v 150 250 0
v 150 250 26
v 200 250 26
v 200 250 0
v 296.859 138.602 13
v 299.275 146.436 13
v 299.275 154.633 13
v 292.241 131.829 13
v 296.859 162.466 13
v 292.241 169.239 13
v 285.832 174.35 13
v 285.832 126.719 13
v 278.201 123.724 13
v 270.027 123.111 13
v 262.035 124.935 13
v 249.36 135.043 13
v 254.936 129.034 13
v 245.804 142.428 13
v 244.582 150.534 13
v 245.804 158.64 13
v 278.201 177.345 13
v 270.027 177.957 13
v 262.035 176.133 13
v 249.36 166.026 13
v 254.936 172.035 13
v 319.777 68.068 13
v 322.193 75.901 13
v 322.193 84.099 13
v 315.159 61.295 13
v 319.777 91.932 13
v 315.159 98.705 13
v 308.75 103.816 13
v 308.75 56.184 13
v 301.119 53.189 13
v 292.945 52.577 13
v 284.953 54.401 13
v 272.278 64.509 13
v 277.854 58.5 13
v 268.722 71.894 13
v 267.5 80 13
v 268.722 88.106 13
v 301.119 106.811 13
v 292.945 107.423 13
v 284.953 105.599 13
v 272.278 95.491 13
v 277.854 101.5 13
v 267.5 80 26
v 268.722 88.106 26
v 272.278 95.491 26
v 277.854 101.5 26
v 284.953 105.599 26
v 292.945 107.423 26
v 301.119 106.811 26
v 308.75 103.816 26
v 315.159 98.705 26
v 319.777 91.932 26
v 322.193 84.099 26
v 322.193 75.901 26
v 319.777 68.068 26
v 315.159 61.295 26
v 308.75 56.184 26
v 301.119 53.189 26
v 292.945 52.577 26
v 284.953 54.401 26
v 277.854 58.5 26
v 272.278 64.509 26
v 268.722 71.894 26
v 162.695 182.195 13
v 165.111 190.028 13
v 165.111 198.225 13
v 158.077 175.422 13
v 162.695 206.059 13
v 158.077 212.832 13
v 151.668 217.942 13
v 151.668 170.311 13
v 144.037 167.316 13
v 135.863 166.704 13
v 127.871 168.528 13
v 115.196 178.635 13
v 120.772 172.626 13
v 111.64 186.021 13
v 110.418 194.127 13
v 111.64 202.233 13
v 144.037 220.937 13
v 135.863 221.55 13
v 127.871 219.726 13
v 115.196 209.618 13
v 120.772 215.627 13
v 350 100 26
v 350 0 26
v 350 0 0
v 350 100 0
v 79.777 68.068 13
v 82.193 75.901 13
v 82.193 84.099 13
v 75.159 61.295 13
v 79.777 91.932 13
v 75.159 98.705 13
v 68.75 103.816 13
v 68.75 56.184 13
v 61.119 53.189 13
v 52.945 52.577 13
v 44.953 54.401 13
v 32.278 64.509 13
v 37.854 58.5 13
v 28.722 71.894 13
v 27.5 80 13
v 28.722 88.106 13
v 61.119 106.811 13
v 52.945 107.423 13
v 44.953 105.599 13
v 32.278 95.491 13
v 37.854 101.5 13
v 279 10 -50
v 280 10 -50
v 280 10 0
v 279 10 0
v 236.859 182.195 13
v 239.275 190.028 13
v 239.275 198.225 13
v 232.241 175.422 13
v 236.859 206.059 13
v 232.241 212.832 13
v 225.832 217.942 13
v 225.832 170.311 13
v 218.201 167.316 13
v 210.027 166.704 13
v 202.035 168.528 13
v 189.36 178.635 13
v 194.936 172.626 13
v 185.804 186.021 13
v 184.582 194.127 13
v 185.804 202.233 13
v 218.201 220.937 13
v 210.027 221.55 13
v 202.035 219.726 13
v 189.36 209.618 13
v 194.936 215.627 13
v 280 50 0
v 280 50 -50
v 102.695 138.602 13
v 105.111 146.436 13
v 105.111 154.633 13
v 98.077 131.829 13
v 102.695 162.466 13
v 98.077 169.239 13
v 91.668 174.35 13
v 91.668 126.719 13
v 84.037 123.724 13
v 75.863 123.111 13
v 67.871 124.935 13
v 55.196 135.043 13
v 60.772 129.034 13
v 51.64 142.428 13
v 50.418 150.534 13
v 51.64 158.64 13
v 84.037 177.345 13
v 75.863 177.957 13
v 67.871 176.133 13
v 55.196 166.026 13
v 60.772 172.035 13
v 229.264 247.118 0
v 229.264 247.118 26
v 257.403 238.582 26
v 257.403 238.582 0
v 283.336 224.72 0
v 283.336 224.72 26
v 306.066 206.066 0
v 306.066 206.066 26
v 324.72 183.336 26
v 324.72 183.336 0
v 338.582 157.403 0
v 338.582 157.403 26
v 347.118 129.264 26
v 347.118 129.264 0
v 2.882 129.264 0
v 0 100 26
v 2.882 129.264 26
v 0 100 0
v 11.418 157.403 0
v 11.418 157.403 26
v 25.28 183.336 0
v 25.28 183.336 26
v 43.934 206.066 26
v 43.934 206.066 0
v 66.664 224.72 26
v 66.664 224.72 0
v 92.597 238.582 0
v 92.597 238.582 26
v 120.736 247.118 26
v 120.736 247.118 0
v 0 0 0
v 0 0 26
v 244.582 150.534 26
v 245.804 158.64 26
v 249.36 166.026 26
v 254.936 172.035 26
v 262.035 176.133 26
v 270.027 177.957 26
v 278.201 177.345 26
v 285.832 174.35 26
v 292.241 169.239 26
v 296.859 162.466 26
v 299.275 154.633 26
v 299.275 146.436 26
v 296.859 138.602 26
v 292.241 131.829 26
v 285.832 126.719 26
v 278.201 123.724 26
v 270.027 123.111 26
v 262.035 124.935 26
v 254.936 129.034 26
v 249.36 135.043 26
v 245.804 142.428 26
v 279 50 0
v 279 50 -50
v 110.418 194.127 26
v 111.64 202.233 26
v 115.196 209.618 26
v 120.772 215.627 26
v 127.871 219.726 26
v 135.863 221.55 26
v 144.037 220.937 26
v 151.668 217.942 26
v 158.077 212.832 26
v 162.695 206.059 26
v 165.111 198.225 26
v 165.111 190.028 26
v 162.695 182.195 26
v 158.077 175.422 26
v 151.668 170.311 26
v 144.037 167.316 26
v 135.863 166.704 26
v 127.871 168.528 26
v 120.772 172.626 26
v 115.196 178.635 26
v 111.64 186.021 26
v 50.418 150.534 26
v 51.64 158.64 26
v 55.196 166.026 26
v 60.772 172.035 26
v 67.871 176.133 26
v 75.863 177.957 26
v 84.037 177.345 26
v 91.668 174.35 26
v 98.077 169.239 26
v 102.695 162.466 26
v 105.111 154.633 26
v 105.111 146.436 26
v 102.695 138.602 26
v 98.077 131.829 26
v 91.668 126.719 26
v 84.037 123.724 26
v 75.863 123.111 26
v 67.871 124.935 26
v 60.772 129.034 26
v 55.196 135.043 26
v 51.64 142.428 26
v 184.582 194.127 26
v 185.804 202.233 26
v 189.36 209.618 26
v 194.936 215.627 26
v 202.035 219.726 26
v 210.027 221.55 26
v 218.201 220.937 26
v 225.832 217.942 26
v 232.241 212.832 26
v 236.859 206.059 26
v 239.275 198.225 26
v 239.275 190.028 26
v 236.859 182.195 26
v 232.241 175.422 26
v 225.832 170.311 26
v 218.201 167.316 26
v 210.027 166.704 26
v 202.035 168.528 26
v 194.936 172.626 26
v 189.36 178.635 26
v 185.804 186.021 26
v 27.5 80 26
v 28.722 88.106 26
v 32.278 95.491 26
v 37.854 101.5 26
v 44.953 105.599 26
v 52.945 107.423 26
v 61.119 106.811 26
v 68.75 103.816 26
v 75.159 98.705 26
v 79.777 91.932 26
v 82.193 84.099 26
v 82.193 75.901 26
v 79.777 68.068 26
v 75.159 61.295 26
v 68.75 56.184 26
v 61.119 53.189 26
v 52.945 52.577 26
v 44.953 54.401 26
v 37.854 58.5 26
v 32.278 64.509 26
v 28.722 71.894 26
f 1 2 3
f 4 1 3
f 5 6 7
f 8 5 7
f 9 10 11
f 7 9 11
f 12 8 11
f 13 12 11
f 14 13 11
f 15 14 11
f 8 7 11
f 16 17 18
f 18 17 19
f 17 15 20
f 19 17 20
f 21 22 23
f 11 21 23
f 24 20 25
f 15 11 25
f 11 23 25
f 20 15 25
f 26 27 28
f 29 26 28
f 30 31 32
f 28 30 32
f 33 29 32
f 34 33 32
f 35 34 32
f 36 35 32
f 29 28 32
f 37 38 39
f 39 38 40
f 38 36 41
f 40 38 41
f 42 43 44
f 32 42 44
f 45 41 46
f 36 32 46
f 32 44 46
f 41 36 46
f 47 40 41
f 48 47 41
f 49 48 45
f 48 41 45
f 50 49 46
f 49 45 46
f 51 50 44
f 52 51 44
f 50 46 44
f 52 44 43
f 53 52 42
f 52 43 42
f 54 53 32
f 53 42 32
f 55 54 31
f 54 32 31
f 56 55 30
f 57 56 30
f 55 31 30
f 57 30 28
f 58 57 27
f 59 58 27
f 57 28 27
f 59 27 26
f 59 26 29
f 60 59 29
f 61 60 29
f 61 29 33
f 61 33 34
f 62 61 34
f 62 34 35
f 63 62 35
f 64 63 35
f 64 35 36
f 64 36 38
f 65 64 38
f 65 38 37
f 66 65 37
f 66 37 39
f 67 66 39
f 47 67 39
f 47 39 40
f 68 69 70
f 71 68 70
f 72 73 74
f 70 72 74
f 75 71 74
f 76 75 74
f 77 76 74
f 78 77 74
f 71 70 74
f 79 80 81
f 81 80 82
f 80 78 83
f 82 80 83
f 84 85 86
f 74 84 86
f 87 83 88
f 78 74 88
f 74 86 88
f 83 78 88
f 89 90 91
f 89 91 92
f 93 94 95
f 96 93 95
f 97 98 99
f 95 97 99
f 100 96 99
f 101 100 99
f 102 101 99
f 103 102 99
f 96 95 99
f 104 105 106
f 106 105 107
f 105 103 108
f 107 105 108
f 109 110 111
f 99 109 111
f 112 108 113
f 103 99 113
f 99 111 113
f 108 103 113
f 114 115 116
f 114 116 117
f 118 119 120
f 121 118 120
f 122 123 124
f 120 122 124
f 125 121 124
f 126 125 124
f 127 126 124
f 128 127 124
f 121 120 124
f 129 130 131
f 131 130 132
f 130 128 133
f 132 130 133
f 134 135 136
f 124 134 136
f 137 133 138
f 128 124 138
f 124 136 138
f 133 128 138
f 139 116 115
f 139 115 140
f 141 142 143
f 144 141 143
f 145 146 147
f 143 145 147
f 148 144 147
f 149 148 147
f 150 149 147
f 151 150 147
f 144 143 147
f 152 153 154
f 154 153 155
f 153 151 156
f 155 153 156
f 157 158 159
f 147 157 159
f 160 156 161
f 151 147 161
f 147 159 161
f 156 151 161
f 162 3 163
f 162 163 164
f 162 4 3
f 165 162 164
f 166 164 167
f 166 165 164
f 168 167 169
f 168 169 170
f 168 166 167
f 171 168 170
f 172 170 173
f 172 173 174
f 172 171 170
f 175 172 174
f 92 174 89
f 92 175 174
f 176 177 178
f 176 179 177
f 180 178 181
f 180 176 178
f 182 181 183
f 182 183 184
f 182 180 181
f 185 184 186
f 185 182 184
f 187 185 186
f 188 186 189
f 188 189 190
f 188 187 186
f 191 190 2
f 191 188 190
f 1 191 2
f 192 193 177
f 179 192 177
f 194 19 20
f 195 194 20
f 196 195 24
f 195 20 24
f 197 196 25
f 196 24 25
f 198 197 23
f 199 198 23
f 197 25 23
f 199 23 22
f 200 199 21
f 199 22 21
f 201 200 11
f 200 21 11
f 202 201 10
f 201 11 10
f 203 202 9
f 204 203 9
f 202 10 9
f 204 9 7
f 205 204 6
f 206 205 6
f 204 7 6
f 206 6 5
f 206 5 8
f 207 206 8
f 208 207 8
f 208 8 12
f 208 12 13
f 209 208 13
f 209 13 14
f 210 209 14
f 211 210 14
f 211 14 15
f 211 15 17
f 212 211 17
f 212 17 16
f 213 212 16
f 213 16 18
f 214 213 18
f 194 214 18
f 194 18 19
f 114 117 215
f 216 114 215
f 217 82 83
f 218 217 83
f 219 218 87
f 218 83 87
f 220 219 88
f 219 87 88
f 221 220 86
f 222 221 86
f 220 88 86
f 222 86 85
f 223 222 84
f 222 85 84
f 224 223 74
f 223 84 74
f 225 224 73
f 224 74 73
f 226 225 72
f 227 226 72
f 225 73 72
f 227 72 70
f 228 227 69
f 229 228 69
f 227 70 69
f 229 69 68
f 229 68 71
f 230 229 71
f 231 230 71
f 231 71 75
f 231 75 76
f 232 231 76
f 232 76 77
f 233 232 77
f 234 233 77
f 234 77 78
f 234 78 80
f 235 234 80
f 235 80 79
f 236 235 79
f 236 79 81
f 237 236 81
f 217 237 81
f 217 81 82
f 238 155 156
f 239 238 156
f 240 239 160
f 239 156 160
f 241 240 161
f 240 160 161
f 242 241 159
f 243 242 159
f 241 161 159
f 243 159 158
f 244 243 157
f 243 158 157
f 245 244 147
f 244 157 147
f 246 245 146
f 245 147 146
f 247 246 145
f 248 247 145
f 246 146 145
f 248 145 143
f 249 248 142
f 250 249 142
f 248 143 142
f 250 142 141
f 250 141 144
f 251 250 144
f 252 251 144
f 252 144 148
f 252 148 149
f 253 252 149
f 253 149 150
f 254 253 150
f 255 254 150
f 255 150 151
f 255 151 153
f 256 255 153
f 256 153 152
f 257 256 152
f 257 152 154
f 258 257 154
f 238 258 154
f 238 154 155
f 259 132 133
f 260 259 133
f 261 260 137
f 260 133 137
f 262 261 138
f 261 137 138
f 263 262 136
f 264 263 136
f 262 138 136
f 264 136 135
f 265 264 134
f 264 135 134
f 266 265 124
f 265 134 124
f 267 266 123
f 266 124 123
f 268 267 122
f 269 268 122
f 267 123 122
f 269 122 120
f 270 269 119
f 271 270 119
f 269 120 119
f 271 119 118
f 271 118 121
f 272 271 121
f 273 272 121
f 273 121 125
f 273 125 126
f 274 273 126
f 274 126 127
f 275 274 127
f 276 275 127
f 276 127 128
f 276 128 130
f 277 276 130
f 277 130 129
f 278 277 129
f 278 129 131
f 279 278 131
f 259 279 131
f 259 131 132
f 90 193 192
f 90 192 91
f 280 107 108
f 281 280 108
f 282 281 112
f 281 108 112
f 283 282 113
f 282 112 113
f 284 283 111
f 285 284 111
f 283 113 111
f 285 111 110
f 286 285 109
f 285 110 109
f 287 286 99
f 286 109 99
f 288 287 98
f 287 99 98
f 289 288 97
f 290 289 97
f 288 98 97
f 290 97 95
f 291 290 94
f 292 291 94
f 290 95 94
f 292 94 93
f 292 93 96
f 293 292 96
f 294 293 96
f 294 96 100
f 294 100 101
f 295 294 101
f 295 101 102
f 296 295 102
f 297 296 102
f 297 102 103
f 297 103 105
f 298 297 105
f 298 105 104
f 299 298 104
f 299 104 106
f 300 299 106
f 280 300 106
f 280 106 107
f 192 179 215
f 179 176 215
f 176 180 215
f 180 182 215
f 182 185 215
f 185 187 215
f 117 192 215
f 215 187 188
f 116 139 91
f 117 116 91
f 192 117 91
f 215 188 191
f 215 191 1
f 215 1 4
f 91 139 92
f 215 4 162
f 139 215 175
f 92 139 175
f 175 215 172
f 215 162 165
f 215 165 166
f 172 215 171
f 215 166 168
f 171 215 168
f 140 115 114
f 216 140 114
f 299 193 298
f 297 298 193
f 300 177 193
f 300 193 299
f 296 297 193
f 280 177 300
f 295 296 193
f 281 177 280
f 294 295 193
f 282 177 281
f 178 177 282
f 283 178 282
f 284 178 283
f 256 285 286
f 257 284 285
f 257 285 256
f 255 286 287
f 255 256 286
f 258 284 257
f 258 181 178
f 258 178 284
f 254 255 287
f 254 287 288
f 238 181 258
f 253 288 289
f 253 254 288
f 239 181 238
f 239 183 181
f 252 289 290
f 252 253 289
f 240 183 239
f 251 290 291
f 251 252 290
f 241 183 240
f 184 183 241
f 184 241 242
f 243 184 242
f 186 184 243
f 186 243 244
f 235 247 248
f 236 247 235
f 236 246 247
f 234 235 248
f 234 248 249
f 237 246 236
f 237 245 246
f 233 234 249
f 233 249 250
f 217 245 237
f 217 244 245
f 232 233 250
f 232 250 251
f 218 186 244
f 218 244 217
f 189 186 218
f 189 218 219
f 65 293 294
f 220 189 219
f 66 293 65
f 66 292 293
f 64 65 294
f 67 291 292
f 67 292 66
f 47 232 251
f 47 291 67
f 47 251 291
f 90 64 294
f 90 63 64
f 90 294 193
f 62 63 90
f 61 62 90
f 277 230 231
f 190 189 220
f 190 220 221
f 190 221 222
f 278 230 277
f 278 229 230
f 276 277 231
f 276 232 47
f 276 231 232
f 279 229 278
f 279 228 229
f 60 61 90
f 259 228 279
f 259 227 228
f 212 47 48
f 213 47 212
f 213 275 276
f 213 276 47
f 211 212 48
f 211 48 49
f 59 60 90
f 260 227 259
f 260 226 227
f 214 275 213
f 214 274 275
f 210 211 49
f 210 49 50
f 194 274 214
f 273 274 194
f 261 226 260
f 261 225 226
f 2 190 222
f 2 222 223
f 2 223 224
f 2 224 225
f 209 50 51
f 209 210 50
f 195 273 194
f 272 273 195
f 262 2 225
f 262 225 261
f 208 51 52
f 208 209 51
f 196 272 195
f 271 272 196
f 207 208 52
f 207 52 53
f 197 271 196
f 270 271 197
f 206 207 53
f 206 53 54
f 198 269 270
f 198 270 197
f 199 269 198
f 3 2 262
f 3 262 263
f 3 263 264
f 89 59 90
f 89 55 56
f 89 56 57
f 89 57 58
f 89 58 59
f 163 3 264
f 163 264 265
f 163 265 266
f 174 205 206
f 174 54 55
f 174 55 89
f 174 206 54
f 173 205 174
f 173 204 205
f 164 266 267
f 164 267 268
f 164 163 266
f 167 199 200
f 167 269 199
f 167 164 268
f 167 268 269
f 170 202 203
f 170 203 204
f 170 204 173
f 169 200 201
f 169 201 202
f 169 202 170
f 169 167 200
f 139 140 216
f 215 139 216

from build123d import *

# Parameters (mm, degrees)
SKETCH1_W                 = 350
SKETCH1_H                 = 250
BOSS_EXTRUDE1_DEPTH       = 26
SKETCH2_W                 = 1
SKETCH2_H                 = 40
BOSS_EXTRUDE2_DEPTH       = 50
M48_CLEARANCE_HOLE1_D     = 55
M48_CLEARANCE_HOLE1_DEPTH = 13
FILLET1_R                 = 150


with BuildPart() as part:
    # Sketch1 → Boss-Extrude1 (new body)
    with BuildSketch(Plane.XY.offset(26)):
        with Locations((175, 125)):
            Rectangle(SKETCH1_W, SKETCH1_H)
    extrude(amount=-BOSS_EXTRUDE1_DEPTH)

    # Sketch2 → Boss-Extrude2 (add)
    with BuildSketch(Plane(origin=(0, 0, 0), x_dir=(-1, 0, 0), z_dir=(0, 0, -1))):
        with Locations((-279.5, 30)):
            Rectangle(SKETCH2_W, SKETCH2_H)
    extrude(amount=BOSS_EXTRUDE2_DEPTH)

    # M48 Clearance Hole1
    with Locations(Plane.XY.offset(26)):
        with Locations((55, 80), (212.082039325, 194.126781955), (272.082039325, 150.534230275), (295, 80), (137.917960675, 194.126781955), (77.917960675, 150.534230275)):
            Hole(M48_CLEARANCE_HOLE1_D / 2, depth=M48_CLEARANCE_HOLE1_DEPTH)

    # Fillet1
    fillet1_edges = [part.edges().sort_by_distance(p)[0] for p in [
        (0, 250, 13),
        (350, 250, 13),
    ]]
    fillet(fillet1_edges, radius=FILLET1_R)


solid = part.part
